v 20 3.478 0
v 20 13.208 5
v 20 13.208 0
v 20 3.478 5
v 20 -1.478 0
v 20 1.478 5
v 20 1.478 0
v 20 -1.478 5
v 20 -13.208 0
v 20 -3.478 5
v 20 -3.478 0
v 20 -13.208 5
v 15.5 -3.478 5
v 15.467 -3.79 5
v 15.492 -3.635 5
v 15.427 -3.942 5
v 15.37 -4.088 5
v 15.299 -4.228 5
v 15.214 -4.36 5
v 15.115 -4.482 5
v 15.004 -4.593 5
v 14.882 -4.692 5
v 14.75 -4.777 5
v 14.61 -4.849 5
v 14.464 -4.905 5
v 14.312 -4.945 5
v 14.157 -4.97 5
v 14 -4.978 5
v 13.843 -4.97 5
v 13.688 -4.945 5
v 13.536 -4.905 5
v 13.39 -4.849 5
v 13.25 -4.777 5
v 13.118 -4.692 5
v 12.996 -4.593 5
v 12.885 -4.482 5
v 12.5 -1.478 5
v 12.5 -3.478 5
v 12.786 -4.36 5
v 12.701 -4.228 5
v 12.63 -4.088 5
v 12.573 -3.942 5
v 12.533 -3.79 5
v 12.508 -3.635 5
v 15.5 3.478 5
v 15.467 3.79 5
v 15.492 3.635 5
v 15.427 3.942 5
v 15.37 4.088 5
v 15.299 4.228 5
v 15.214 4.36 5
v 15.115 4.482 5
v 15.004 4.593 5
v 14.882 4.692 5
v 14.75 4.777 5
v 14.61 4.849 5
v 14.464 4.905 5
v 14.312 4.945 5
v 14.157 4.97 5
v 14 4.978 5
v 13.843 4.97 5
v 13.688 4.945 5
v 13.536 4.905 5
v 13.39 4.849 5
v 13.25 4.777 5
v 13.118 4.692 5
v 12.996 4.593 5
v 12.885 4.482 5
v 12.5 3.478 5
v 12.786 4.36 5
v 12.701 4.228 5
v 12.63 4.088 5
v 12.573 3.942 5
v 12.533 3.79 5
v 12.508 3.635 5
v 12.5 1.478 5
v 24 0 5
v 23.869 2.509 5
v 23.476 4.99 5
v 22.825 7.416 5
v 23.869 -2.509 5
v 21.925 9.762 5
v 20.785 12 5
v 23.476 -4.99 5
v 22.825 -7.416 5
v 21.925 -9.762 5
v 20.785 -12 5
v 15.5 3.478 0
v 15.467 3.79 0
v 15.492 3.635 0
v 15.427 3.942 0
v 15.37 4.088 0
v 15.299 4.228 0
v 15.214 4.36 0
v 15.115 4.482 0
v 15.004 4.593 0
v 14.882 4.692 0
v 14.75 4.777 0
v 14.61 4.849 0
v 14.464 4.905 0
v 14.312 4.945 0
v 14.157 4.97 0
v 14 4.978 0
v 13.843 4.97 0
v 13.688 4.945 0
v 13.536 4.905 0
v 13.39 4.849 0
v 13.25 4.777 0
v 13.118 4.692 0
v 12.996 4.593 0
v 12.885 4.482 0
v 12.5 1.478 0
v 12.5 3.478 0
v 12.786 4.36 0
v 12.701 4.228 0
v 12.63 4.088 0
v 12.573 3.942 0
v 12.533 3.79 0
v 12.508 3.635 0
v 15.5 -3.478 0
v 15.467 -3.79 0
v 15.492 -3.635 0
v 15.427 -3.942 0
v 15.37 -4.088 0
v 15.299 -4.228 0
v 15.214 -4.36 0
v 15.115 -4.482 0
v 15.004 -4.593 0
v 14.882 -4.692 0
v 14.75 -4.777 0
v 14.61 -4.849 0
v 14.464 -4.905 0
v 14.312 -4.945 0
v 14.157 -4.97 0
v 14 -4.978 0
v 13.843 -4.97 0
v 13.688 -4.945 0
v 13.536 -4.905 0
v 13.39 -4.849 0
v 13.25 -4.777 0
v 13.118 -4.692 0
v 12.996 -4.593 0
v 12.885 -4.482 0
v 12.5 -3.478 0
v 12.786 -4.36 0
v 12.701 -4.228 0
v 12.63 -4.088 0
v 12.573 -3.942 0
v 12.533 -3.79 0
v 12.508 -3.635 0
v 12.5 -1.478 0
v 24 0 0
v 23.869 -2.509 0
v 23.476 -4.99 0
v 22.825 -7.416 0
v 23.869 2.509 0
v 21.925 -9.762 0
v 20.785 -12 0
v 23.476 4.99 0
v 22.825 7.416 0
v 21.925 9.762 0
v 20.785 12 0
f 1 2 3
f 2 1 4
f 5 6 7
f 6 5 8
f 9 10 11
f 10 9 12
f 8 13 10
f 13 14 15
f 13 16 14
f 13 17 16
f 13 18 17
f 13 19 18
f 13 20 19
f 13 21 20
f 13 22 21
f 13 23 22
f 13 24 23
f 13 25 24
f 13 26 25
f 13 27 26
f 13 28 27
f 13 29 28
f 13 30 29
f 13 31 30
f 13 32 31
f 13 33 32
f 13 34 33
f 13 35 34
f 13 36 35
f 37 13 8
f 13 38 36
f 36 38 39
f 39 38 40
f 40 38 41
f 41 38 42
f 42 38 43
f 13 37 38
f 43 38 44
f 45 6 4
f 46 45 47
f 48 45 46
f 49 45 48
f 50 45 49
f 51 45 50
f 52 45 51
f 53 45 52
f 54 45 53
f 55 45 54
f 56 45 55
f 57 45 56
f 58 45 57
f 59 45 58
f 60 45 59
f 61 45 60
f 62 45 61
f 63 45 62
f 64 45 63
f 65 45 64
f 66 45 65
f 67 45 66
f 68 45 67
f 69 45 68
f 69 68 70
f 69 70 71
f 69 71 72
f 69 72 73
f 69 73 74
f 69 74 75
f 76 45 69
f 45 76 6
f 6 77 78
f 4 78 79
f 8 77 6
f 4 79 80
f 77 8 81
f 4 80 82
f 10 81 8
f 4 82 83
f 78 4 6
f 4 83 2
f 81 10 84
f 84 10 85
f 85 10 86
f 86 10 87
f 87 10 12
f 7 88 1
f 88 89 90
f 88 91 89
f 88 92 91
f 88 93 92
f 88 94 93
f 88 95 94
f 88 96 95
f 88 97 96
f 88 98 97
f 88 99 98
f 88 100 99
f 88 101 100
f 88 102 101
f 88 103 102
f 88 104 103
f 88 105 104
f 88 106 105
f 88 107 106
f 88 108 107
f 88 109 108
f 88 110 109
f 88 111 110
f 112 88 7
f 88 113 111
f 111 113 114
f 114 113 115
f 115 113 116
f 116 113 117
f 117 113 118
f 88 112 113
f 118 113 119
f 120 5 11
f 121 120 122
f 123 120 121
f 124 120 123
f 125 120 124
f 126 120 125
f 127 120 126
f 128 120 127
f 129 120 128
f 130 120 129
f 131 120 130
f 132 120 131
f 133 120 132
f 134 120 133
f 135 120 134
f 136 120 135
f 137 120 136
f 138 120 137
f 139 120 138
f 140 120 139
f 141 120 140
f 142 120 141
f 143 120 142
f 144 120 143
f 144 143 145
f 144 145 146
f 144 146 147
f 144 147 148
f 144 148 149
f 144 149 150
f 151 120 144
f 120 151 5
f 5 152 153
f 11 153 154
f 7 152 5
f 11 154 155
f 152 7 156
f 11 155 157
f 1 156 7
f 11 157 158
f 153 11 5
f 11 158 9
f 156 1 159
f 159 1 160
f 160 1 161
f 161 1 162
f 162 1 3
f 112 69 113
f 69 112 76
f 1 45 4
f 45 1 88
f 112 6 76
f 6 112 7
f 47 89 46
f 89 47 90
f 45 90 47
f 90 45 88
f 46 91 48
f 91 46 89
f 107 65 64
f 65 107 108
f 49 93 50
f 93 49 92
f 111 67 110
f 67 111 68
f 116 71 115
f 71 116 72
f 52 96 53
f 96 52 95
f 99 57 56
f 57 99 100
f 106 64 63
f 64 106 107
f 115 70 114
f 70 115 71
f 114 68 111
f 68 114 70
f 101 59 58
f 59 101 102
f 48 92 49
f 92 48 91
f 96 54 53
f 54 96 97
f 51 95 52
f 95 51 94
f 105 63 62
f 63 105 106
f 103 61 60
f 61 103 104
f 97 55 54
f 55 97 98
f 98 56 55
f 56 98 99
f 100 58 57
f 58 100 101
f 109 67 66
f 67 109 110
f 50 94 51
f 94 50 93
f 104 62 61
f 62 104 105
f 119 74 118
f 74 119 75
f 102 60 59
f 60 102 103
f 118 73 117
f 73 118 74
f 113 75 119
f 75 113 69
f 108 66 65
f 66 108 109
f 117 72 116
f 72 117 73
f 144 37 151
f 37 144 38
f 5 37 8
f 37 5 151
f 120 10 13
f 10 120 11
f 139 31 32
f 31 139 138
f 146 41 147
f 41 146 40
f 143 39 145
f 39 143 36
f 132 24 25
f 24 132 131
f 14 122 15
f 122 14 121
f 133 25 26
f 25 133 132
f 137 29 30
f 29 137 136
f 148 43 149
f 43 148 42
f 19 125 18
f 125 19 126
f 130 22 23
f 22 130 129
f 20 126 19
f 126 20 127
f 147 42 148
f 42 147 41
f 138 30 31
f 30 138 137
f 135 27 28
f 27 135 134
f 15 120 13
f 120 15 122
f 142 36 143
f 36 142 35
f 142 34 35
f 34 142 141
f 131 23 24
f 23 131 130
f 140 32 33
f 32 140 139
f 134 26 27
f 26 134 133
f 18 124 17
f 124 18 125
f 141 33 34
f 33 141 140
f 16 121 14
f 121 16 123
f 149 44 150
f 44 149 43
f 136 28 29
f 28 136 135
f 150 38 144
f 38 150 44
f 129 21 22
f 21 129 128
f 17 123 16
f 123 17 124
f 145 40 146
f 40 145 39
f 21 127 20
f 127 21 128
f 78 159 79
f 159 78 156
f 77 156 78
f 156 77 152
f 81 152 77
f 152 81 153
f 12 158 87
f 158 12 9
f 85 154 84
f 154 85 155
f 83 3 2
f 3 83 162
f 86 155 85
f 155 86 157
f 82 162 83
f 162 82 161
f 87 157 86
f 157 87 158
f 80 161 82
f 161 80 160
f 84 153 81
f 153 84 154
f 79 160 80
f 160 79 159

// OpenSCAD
// file: config.scad
diameter=392;
bar_length=.95*cos(30)*diameter; // 322
bar_height=25;
bar_scale = 1.02; // allow extra space to fit
bar_thickness=2.5;
extrusion_length = 1000;
extrusion_scale = 1.02; // allow extra space to fit

// outer brace upper bracket configuration
outer_brace_upper_bracket_height = 35.6;
endstop_hole_diameter = 2.2; // should be drill size but slightly bigger works
// distance from center of hole to center of endstop
endstop_hole_width = 4.75;
// distance from center of trigger to center of endstop
endstop_trigger_offset = 3.125;

// these are not required for printing just for the model
endstop_hole_height = 1.5+2.5/2;
endstop_width = 20;
endstop_height = 10.75;
endstop_depth = 6.5;
endstop_trigger_width = 1.75;
endstop_trigger_height = 1.25;
endstop_trigger_depth = 2.5;

// outer brace bottom bracket configuration
base_thickness = 2.55; // height of bottom of extrusion above ground
// file: metric-cerberus.scad
include <config.scad>

module extrusion4040(h=1000) {
  translate([-20,-20,0])
    linear_extrude(height=h) import("extrusion.dxf");
}

module endstop(h = endstop_height, w = endstop_width, d = endstop_depth,
               r = endstop_hole_diameter/2, ehh = endstop_hole_height,
               ehw = endstop_hole_width,
               eth = endstop_trigger_height, etw = endstop_trigger_width,
               etd = endstop_trigger_depth, eto = endstop_trigger_offset,
               ) {
  difference() {
    translate([0, 0, h/2]) cube([w, d, h], center = true);
    for (i=[1,-1])
      translate([i*endstop_hole_width, 0, ehh])
        rotate([90,0,0]) cylinder(r = r, h = endstop_depth+1, center = true, $fn = 12);
  }
  translate([eto, 0, h+eth/2]) color("Red")
    cube([etw, etd, eth], center = true);
}

module mushroom(min_slot_width = 7.5, max_slot_width = 9,
                slot_depth = 5, inner_width = 12,
                mushroom_depth = 11.75, mushroom_depth_1 = 7,
                mushroom_depth_2 = 9.5, mushroom_width_2 = 15.5,
                max_mushroom_width = 18.5, min_mushroom_width = 10,
                mushroom_lip_width = 2,
                mushroom_lip_depth = 1,
                width = 40, h = 40, margin = .5) {
  translate([0, -width/2, 0])
  linear_extrude(h=h, convexity = 8)
    polygon(points=[
      [-(max_slot_width/2+margin), 0-margin],
      [-min_slot_width/2, (max_slot_width-min_slot_width)/2],
      [-min_slot_width/2, slot_depth-(max_slot_width-min_slot_width)/2],
      [-max_slot_width/2, slot_depth],

      [-(max_mushroom_width/2-mushroom_lip_width), slot_depth],
      [-(max_mushroom_width/2-mushroom_lip_width), slot_depth-mushroom_lip_depth],
      [-max_mushroom_width/2, slot_depth-mushroom_lip_depth],

      [-max_mushroom_width/2, mushroom_depth_1],
      [-mushroom_width_2/2, mushroom_depth_2],
      [-min_mushroom_width/2, mushroom_depth],

      [min_mushroom_width/2, mushroom_depth],
      [mushroom_width_2/2, mushroom_depth_2],
      [max_mushroom_width/2, mushroom_depth_1],

      [max_mushroom_width/2, slot_depth-mushroom_lip_depth],
      [(max_mushroom_width/2-mushroom_lip_width), slot_depth-mushroom_lip_depth],
      [(max_mushroom_width/2-mushroom_lip_width), slot_depth],
      [max_slot_width/2, slot_depth],
      [min_slot_width/2, slot_depth-(max_slot_width-min_slot_width)/2],
      [min_slot_width/2,  (max_slot_width-min_slot_width)/2],
      [(max_slot_width/2+margin), 0-margin],
    ]);
}

module extrusion4040_no_hole(h=40, corner_radius = 4, width = 40,
                             mushroom_angles = [0, 90, 180, 270]) {
  half = width/2;
  offset = half-corner_radius;
  difference() {
    hull() {
      for (i=[1,-1]) {
        for (j=[1,-1]) {
          translate([i*offset*extrusion_scale, j*offset*extrusion_scale, 0])
            cylinder(r=corner_radius*extrusion_scale, h = h, $fn = 30);
        }
      }
    }
    for (r=mushroom_angles) {
      rotate([0,0,r]) translate([0,0,-.5]) mushroom(h=h+1);
    }
  }
}

module fixing_bar(length = 320, height = 25, thickness = 2.5,
                  hole_radius = 4.2/2, hole_offset = 19) {
  rotate([0, 0, -30])
    translate([-(thickness/2+20.2), -(length/2+8.5), height/2])
      difference() {
        cube([thickness, length, height], center = true);
        for (i=[1,-1]) {
          translate([0,i*(length/2-hole_offset),0])
            rotate([0,90,0])
              cylinder(r=hole_radius, h=thickness+2, center = true, $fn = 24);
        }
      }
}

module slots_for_bars(h = 25.8, hole_diameter = 4.2) {

  for (i=[1,-1]) {
    // slots for bars
    rotate([0, 0, i*30]) translate([i*21.5, -57.5, h/2])
      cube([3, 100, h], center = true);

    // cutouts beside bars
    rotate([0, 0, i*30]) translate([i*26, -65, h/2])
      cube([10, 100, h], center = true);

    // holes to secure bar
    translate([i*30.95, -13.95, h/2])
      rotate([0, 90, i*30])
        cylinder(r=hole_diameter/2, h=38, $fn = 12, center = true);
  }
}

module tripod_cutout(h=20) { // used by upper bracket
  translate([0,-25,h/2+15.6]) cube([30,20,h], center = true);
  difference() {
    translate([0,-19,h/2 + 15.6]) cube([40,10,h], center = true);
    translate([21.5,-19,(h+2)/2 + 15.6]) rotate([0,0,30]) cube([10,10,h+2], center = true);
    translate([-21.5,-19,(h+2)/2 + 15.6]) rotate([0,0,-30]) cube([10,10,h+2], center = true);
  }
}

module outer_brace_upper_bracket(h = outer_brace_upper_bracket_height,
                                 endstop_hole_width = endstop_hole_width,
                                 endstop_hole_diameter = endstop_hole_diameter)
{
  difference() {
    union() {
      translate([0, -.5, h/2])
        cylinder(r=32, h = h, center = true);
      for (i=[1,-1])
        rotate([0,0,i*30]) translate([0, -20, h/2])
          cube([46, 55, h], center = true);
    }

    // cut for extrusion
    translate([0, 0, -1])
      extrusion4040_no_hole(h=40, mushroom_angles = [90,180,270]);

    // cut to form outer face
    translate([0, 47, 29]) cube([100, 40, 60], center=true);

    // cut to form inner face
    translate([0, -47, 29]) cube([100, 40, 60], center=true);

    // cut to form top face
    translate([0, 100/2-40/2, 60/2+h]) cube([100, 100, 60], center=true);

    translate([0, 0, 5.3]) slots_for_bars();

    // end stop holes
    for (i=[1,-1]) {
      translate([i*endstop_hole_width+endstop_trigger_offset, -15, 3.7])
        rotate([90,0,0]) cylinder(r=endstop_hole_diameter/2, h=20, $fn=12);
    }

    // other holes
    translate([-13,-15,10.5]) rotate([90,0,0]) cylinder(r=1.5, h=20, $fn=12);
    translate([13,-15,10.5]) rotate([90,0,0]) cylinder(r=1.5, h=20, $fn=12);

    // cutout for tripod
    tripod_cutout(h=21);
  }
}

module outer_brace_bottom_bracket(h = 38) {
  difference() {
    union() {
      translate([0, -.5, 22.5])
        cylinder(r=32, h = 45, center = true);
      for (i=[1,-1])
        rotate([0,0,i*30]) translate([0, -20, 19])
          cube([46, 55, 38], center = true);
    }

    // cut for extrusion
    translate([0, 0, base_thickness]) extrusion4040_no_hole(h=60);

    // cut to form outer face
    translate([0, 47, 29]) cube([100, 40, 60], center=true);

    // cut to form inner face
    translate([0, -47, 29]) cube([100, 40, 60], center=true);

    // cut to form top face
    for (i=[-1,1]) {
      translate([i*43, 100/2-40/2, 60/2+38.1]) rotate([0,0,i*45])
        cube([100, 100, 60], center=true);
    }

    translate([0, 0, 7.6]) slots_for_bars();
  }
}

module outer_brace_bottom_jig(h = 25.4, hole_diameter = 4.2) {
  intersection() {
    difference() {
      outer_brace_bottom_bracket();
      translate([500,0,500-.1]) cube([1000,1000,1000], center = true);
      translate([-30.95, -13.95, 7.6+h/2])
        rotate([0, 90, -30])
        cylinder(r=hole_diameter/2, h=100, $fn = 12, center = true);

    }
    translate([-30.95, -13.95, 7.6+h/2])
      rotate([0, 90, -30])
        translate([0,2,12]) cube([10,6,24], center = true);
  }
  translate([-30.95, -13.95, 0])
    rotate([0, 0, -30]) {
      translate([3,0,(7.6+h/2)/2-2]) cube([6,2,7.6+h/2-4], center = true);
      translate([21,0,(7.6+h/2)/2-2]) cube([6,2,7.6+h/2-4], center = true);
      translate([12, 1.5, -1]) cube([24,5,2], center = true);
    }
}

module upper_idler_adjuster_body(h = 60) {
  
  corner_radius=4;
  width=40;
  half_width=width/2;
  offset = half_width-corner_radius;

  difference() {
    // main block
    hull() {
      for (a=[[offset, offset, h/2],[offset, -offset, h/2],
              [-offset, -offset, h/2],[-offset, offset, h/2]]) {
        translate(a) cylinder(r=4, h=h, center = true);
      }
    }
    // cut for extrusion
    translate([0, 0, h-10]) extrusion4040_no_hole(h=h);

    // hollow
    difference() {
      translate([-4.95, 0, 3+(50+30)/2]) cube([26.75,21,50+30], center = true);
      for (i=[-1,1])
        translate([-4.95, i*(8/2+4.8), 3+(50+30)/2]) cube([4.5,8,50+30], center = true);
    }
    // hole
    translate([-12.8,0,0]) cylinder(r=2, h=10, center = true, $fn = 12);

    // slot
    translate([-19,0,20]) {
      translate([0, 0, 100/2]) cube([5, 8, 100], center = true);
      rotate([0,90,0]) cylinder(r = 4, h = 5, center = true, $fn=24);
    }
    translate([-8, 0, h]) cube([26.75,21,20], center = true);

  }
}

module upper_idler_adjuster_axle(h = 16, r = 4, base_r = 10, base_h = 1) {
  cylinder(r=base_r, h=base_h);
  cylinder(r=r, h=h);
}

module tripod_brace_bottom_to_print() {
    import("Cerberus/stl/Tripod Brace Bott with Motor Mount - for snap fit lower idler.stl");
}

module tripod_brace_bottom() {
  rotate([0,180,0])
    translate([-54.25,-57,-30])
    import("Cerberus/stl/Tripod Brace Bott with Motor Mount - for snap fit lower idler.stl");
}

module tripod_brace_top() {
  rotate([0,0,-43.4])
    translate([-81.35,64,0])
    import("Cerberus/stl/Tripod Brace Top v2.stl");
}

module vert_carriage_for_623_dual_bearing_roller_to_print() {
  import("Cerberus/stl/Vert carriage for 623 Dual Bearing Roller.stl");
}

module vert_carriage_for_623_dual_bearing_roller() {
  rotate([0,0,180]) translate([-5.5, 32, 0]) rotate([90, 0, 0])
    import("Cerberus/stl/Vert carriage for 623 Dual Bearing Roller.stl");
}

module tripod_hole_jig(h = 15+(45-base_thickness),
                       r = 5.2/2, w = 40) {
  difference() {
    union() {
      difference() {
        cube([w+4, h+r+base_thickness+2, 8], center = true);
        translate([0, 1.5, base_thickness])
          cube([w*extrusion_scale, h+r+2+1, 6], center = true);
      }
      cube([7.5, h+r+base_thickness+2, 8], center = true);
    }
    translate([0, h/2-2, 0]) cylinder(r = r, h = 20, $fn = 18, center = true);
  }
}
// main file
include <metric-cerberus.scad>

%extrusion4040(h = 10);

h=5;
w=40;
allowance=1.15;
fn=60;
slot_width=8/allowance;
slot_depth=7.5;
slot_thickness=2;
r=1.5;


intersection() {
  cable_only();
  //hex_tools();
  //tweezers();
  //knife();
  //snips();
  union() {
    translate([w/2,-w*.8/2,0]) cube([w*.8,w*.8,h]);
    for (i=[1,-1]) {
      translate([w/2-slot_depth/2, i*(slot_width-slot_thickness)/2, h/2])
        cube([slot_depth,slot_thickness,h], center=true);
      translate([w/2-slot_depth+r, i*slot_width/2, h/2])
        cylinder(h=h, r=r, center=true, $fn = fn);
    }
  }
}

module cable_only() {
  cylinder(h=h, r=1.2*w/2, $fn = fn);
}

module slot(sw, sd) {
  difference() {
    cylinder(h=h, r=w/2+sd+6, $fn = fn);
    translate([(w+sd+6)/2-1, 0, 0]) cube([sd, sw, h*3], center = true);
  }
}

module snips() {
  slot(20, 10);
}

module knife() {
  slot(20, 3);
}

module tweezers() {
  slot(12, 3);
}

module hex_tools() {
  difference() {
    cylinder(h=h, r=1.4*w/2, $fn = fn);
    translate([1.2*w/2, -4, 0])
        cylinder(r = (2.5/cos(30)+0.75)/2, h = h*3, center = true, $fn = 6);
    translate([1.2*w/2, 4, 0])
        cylinder(r = (4/cos(30)+0.75)/2, h = h*3, center = true, $fn = 6);
  }
}
